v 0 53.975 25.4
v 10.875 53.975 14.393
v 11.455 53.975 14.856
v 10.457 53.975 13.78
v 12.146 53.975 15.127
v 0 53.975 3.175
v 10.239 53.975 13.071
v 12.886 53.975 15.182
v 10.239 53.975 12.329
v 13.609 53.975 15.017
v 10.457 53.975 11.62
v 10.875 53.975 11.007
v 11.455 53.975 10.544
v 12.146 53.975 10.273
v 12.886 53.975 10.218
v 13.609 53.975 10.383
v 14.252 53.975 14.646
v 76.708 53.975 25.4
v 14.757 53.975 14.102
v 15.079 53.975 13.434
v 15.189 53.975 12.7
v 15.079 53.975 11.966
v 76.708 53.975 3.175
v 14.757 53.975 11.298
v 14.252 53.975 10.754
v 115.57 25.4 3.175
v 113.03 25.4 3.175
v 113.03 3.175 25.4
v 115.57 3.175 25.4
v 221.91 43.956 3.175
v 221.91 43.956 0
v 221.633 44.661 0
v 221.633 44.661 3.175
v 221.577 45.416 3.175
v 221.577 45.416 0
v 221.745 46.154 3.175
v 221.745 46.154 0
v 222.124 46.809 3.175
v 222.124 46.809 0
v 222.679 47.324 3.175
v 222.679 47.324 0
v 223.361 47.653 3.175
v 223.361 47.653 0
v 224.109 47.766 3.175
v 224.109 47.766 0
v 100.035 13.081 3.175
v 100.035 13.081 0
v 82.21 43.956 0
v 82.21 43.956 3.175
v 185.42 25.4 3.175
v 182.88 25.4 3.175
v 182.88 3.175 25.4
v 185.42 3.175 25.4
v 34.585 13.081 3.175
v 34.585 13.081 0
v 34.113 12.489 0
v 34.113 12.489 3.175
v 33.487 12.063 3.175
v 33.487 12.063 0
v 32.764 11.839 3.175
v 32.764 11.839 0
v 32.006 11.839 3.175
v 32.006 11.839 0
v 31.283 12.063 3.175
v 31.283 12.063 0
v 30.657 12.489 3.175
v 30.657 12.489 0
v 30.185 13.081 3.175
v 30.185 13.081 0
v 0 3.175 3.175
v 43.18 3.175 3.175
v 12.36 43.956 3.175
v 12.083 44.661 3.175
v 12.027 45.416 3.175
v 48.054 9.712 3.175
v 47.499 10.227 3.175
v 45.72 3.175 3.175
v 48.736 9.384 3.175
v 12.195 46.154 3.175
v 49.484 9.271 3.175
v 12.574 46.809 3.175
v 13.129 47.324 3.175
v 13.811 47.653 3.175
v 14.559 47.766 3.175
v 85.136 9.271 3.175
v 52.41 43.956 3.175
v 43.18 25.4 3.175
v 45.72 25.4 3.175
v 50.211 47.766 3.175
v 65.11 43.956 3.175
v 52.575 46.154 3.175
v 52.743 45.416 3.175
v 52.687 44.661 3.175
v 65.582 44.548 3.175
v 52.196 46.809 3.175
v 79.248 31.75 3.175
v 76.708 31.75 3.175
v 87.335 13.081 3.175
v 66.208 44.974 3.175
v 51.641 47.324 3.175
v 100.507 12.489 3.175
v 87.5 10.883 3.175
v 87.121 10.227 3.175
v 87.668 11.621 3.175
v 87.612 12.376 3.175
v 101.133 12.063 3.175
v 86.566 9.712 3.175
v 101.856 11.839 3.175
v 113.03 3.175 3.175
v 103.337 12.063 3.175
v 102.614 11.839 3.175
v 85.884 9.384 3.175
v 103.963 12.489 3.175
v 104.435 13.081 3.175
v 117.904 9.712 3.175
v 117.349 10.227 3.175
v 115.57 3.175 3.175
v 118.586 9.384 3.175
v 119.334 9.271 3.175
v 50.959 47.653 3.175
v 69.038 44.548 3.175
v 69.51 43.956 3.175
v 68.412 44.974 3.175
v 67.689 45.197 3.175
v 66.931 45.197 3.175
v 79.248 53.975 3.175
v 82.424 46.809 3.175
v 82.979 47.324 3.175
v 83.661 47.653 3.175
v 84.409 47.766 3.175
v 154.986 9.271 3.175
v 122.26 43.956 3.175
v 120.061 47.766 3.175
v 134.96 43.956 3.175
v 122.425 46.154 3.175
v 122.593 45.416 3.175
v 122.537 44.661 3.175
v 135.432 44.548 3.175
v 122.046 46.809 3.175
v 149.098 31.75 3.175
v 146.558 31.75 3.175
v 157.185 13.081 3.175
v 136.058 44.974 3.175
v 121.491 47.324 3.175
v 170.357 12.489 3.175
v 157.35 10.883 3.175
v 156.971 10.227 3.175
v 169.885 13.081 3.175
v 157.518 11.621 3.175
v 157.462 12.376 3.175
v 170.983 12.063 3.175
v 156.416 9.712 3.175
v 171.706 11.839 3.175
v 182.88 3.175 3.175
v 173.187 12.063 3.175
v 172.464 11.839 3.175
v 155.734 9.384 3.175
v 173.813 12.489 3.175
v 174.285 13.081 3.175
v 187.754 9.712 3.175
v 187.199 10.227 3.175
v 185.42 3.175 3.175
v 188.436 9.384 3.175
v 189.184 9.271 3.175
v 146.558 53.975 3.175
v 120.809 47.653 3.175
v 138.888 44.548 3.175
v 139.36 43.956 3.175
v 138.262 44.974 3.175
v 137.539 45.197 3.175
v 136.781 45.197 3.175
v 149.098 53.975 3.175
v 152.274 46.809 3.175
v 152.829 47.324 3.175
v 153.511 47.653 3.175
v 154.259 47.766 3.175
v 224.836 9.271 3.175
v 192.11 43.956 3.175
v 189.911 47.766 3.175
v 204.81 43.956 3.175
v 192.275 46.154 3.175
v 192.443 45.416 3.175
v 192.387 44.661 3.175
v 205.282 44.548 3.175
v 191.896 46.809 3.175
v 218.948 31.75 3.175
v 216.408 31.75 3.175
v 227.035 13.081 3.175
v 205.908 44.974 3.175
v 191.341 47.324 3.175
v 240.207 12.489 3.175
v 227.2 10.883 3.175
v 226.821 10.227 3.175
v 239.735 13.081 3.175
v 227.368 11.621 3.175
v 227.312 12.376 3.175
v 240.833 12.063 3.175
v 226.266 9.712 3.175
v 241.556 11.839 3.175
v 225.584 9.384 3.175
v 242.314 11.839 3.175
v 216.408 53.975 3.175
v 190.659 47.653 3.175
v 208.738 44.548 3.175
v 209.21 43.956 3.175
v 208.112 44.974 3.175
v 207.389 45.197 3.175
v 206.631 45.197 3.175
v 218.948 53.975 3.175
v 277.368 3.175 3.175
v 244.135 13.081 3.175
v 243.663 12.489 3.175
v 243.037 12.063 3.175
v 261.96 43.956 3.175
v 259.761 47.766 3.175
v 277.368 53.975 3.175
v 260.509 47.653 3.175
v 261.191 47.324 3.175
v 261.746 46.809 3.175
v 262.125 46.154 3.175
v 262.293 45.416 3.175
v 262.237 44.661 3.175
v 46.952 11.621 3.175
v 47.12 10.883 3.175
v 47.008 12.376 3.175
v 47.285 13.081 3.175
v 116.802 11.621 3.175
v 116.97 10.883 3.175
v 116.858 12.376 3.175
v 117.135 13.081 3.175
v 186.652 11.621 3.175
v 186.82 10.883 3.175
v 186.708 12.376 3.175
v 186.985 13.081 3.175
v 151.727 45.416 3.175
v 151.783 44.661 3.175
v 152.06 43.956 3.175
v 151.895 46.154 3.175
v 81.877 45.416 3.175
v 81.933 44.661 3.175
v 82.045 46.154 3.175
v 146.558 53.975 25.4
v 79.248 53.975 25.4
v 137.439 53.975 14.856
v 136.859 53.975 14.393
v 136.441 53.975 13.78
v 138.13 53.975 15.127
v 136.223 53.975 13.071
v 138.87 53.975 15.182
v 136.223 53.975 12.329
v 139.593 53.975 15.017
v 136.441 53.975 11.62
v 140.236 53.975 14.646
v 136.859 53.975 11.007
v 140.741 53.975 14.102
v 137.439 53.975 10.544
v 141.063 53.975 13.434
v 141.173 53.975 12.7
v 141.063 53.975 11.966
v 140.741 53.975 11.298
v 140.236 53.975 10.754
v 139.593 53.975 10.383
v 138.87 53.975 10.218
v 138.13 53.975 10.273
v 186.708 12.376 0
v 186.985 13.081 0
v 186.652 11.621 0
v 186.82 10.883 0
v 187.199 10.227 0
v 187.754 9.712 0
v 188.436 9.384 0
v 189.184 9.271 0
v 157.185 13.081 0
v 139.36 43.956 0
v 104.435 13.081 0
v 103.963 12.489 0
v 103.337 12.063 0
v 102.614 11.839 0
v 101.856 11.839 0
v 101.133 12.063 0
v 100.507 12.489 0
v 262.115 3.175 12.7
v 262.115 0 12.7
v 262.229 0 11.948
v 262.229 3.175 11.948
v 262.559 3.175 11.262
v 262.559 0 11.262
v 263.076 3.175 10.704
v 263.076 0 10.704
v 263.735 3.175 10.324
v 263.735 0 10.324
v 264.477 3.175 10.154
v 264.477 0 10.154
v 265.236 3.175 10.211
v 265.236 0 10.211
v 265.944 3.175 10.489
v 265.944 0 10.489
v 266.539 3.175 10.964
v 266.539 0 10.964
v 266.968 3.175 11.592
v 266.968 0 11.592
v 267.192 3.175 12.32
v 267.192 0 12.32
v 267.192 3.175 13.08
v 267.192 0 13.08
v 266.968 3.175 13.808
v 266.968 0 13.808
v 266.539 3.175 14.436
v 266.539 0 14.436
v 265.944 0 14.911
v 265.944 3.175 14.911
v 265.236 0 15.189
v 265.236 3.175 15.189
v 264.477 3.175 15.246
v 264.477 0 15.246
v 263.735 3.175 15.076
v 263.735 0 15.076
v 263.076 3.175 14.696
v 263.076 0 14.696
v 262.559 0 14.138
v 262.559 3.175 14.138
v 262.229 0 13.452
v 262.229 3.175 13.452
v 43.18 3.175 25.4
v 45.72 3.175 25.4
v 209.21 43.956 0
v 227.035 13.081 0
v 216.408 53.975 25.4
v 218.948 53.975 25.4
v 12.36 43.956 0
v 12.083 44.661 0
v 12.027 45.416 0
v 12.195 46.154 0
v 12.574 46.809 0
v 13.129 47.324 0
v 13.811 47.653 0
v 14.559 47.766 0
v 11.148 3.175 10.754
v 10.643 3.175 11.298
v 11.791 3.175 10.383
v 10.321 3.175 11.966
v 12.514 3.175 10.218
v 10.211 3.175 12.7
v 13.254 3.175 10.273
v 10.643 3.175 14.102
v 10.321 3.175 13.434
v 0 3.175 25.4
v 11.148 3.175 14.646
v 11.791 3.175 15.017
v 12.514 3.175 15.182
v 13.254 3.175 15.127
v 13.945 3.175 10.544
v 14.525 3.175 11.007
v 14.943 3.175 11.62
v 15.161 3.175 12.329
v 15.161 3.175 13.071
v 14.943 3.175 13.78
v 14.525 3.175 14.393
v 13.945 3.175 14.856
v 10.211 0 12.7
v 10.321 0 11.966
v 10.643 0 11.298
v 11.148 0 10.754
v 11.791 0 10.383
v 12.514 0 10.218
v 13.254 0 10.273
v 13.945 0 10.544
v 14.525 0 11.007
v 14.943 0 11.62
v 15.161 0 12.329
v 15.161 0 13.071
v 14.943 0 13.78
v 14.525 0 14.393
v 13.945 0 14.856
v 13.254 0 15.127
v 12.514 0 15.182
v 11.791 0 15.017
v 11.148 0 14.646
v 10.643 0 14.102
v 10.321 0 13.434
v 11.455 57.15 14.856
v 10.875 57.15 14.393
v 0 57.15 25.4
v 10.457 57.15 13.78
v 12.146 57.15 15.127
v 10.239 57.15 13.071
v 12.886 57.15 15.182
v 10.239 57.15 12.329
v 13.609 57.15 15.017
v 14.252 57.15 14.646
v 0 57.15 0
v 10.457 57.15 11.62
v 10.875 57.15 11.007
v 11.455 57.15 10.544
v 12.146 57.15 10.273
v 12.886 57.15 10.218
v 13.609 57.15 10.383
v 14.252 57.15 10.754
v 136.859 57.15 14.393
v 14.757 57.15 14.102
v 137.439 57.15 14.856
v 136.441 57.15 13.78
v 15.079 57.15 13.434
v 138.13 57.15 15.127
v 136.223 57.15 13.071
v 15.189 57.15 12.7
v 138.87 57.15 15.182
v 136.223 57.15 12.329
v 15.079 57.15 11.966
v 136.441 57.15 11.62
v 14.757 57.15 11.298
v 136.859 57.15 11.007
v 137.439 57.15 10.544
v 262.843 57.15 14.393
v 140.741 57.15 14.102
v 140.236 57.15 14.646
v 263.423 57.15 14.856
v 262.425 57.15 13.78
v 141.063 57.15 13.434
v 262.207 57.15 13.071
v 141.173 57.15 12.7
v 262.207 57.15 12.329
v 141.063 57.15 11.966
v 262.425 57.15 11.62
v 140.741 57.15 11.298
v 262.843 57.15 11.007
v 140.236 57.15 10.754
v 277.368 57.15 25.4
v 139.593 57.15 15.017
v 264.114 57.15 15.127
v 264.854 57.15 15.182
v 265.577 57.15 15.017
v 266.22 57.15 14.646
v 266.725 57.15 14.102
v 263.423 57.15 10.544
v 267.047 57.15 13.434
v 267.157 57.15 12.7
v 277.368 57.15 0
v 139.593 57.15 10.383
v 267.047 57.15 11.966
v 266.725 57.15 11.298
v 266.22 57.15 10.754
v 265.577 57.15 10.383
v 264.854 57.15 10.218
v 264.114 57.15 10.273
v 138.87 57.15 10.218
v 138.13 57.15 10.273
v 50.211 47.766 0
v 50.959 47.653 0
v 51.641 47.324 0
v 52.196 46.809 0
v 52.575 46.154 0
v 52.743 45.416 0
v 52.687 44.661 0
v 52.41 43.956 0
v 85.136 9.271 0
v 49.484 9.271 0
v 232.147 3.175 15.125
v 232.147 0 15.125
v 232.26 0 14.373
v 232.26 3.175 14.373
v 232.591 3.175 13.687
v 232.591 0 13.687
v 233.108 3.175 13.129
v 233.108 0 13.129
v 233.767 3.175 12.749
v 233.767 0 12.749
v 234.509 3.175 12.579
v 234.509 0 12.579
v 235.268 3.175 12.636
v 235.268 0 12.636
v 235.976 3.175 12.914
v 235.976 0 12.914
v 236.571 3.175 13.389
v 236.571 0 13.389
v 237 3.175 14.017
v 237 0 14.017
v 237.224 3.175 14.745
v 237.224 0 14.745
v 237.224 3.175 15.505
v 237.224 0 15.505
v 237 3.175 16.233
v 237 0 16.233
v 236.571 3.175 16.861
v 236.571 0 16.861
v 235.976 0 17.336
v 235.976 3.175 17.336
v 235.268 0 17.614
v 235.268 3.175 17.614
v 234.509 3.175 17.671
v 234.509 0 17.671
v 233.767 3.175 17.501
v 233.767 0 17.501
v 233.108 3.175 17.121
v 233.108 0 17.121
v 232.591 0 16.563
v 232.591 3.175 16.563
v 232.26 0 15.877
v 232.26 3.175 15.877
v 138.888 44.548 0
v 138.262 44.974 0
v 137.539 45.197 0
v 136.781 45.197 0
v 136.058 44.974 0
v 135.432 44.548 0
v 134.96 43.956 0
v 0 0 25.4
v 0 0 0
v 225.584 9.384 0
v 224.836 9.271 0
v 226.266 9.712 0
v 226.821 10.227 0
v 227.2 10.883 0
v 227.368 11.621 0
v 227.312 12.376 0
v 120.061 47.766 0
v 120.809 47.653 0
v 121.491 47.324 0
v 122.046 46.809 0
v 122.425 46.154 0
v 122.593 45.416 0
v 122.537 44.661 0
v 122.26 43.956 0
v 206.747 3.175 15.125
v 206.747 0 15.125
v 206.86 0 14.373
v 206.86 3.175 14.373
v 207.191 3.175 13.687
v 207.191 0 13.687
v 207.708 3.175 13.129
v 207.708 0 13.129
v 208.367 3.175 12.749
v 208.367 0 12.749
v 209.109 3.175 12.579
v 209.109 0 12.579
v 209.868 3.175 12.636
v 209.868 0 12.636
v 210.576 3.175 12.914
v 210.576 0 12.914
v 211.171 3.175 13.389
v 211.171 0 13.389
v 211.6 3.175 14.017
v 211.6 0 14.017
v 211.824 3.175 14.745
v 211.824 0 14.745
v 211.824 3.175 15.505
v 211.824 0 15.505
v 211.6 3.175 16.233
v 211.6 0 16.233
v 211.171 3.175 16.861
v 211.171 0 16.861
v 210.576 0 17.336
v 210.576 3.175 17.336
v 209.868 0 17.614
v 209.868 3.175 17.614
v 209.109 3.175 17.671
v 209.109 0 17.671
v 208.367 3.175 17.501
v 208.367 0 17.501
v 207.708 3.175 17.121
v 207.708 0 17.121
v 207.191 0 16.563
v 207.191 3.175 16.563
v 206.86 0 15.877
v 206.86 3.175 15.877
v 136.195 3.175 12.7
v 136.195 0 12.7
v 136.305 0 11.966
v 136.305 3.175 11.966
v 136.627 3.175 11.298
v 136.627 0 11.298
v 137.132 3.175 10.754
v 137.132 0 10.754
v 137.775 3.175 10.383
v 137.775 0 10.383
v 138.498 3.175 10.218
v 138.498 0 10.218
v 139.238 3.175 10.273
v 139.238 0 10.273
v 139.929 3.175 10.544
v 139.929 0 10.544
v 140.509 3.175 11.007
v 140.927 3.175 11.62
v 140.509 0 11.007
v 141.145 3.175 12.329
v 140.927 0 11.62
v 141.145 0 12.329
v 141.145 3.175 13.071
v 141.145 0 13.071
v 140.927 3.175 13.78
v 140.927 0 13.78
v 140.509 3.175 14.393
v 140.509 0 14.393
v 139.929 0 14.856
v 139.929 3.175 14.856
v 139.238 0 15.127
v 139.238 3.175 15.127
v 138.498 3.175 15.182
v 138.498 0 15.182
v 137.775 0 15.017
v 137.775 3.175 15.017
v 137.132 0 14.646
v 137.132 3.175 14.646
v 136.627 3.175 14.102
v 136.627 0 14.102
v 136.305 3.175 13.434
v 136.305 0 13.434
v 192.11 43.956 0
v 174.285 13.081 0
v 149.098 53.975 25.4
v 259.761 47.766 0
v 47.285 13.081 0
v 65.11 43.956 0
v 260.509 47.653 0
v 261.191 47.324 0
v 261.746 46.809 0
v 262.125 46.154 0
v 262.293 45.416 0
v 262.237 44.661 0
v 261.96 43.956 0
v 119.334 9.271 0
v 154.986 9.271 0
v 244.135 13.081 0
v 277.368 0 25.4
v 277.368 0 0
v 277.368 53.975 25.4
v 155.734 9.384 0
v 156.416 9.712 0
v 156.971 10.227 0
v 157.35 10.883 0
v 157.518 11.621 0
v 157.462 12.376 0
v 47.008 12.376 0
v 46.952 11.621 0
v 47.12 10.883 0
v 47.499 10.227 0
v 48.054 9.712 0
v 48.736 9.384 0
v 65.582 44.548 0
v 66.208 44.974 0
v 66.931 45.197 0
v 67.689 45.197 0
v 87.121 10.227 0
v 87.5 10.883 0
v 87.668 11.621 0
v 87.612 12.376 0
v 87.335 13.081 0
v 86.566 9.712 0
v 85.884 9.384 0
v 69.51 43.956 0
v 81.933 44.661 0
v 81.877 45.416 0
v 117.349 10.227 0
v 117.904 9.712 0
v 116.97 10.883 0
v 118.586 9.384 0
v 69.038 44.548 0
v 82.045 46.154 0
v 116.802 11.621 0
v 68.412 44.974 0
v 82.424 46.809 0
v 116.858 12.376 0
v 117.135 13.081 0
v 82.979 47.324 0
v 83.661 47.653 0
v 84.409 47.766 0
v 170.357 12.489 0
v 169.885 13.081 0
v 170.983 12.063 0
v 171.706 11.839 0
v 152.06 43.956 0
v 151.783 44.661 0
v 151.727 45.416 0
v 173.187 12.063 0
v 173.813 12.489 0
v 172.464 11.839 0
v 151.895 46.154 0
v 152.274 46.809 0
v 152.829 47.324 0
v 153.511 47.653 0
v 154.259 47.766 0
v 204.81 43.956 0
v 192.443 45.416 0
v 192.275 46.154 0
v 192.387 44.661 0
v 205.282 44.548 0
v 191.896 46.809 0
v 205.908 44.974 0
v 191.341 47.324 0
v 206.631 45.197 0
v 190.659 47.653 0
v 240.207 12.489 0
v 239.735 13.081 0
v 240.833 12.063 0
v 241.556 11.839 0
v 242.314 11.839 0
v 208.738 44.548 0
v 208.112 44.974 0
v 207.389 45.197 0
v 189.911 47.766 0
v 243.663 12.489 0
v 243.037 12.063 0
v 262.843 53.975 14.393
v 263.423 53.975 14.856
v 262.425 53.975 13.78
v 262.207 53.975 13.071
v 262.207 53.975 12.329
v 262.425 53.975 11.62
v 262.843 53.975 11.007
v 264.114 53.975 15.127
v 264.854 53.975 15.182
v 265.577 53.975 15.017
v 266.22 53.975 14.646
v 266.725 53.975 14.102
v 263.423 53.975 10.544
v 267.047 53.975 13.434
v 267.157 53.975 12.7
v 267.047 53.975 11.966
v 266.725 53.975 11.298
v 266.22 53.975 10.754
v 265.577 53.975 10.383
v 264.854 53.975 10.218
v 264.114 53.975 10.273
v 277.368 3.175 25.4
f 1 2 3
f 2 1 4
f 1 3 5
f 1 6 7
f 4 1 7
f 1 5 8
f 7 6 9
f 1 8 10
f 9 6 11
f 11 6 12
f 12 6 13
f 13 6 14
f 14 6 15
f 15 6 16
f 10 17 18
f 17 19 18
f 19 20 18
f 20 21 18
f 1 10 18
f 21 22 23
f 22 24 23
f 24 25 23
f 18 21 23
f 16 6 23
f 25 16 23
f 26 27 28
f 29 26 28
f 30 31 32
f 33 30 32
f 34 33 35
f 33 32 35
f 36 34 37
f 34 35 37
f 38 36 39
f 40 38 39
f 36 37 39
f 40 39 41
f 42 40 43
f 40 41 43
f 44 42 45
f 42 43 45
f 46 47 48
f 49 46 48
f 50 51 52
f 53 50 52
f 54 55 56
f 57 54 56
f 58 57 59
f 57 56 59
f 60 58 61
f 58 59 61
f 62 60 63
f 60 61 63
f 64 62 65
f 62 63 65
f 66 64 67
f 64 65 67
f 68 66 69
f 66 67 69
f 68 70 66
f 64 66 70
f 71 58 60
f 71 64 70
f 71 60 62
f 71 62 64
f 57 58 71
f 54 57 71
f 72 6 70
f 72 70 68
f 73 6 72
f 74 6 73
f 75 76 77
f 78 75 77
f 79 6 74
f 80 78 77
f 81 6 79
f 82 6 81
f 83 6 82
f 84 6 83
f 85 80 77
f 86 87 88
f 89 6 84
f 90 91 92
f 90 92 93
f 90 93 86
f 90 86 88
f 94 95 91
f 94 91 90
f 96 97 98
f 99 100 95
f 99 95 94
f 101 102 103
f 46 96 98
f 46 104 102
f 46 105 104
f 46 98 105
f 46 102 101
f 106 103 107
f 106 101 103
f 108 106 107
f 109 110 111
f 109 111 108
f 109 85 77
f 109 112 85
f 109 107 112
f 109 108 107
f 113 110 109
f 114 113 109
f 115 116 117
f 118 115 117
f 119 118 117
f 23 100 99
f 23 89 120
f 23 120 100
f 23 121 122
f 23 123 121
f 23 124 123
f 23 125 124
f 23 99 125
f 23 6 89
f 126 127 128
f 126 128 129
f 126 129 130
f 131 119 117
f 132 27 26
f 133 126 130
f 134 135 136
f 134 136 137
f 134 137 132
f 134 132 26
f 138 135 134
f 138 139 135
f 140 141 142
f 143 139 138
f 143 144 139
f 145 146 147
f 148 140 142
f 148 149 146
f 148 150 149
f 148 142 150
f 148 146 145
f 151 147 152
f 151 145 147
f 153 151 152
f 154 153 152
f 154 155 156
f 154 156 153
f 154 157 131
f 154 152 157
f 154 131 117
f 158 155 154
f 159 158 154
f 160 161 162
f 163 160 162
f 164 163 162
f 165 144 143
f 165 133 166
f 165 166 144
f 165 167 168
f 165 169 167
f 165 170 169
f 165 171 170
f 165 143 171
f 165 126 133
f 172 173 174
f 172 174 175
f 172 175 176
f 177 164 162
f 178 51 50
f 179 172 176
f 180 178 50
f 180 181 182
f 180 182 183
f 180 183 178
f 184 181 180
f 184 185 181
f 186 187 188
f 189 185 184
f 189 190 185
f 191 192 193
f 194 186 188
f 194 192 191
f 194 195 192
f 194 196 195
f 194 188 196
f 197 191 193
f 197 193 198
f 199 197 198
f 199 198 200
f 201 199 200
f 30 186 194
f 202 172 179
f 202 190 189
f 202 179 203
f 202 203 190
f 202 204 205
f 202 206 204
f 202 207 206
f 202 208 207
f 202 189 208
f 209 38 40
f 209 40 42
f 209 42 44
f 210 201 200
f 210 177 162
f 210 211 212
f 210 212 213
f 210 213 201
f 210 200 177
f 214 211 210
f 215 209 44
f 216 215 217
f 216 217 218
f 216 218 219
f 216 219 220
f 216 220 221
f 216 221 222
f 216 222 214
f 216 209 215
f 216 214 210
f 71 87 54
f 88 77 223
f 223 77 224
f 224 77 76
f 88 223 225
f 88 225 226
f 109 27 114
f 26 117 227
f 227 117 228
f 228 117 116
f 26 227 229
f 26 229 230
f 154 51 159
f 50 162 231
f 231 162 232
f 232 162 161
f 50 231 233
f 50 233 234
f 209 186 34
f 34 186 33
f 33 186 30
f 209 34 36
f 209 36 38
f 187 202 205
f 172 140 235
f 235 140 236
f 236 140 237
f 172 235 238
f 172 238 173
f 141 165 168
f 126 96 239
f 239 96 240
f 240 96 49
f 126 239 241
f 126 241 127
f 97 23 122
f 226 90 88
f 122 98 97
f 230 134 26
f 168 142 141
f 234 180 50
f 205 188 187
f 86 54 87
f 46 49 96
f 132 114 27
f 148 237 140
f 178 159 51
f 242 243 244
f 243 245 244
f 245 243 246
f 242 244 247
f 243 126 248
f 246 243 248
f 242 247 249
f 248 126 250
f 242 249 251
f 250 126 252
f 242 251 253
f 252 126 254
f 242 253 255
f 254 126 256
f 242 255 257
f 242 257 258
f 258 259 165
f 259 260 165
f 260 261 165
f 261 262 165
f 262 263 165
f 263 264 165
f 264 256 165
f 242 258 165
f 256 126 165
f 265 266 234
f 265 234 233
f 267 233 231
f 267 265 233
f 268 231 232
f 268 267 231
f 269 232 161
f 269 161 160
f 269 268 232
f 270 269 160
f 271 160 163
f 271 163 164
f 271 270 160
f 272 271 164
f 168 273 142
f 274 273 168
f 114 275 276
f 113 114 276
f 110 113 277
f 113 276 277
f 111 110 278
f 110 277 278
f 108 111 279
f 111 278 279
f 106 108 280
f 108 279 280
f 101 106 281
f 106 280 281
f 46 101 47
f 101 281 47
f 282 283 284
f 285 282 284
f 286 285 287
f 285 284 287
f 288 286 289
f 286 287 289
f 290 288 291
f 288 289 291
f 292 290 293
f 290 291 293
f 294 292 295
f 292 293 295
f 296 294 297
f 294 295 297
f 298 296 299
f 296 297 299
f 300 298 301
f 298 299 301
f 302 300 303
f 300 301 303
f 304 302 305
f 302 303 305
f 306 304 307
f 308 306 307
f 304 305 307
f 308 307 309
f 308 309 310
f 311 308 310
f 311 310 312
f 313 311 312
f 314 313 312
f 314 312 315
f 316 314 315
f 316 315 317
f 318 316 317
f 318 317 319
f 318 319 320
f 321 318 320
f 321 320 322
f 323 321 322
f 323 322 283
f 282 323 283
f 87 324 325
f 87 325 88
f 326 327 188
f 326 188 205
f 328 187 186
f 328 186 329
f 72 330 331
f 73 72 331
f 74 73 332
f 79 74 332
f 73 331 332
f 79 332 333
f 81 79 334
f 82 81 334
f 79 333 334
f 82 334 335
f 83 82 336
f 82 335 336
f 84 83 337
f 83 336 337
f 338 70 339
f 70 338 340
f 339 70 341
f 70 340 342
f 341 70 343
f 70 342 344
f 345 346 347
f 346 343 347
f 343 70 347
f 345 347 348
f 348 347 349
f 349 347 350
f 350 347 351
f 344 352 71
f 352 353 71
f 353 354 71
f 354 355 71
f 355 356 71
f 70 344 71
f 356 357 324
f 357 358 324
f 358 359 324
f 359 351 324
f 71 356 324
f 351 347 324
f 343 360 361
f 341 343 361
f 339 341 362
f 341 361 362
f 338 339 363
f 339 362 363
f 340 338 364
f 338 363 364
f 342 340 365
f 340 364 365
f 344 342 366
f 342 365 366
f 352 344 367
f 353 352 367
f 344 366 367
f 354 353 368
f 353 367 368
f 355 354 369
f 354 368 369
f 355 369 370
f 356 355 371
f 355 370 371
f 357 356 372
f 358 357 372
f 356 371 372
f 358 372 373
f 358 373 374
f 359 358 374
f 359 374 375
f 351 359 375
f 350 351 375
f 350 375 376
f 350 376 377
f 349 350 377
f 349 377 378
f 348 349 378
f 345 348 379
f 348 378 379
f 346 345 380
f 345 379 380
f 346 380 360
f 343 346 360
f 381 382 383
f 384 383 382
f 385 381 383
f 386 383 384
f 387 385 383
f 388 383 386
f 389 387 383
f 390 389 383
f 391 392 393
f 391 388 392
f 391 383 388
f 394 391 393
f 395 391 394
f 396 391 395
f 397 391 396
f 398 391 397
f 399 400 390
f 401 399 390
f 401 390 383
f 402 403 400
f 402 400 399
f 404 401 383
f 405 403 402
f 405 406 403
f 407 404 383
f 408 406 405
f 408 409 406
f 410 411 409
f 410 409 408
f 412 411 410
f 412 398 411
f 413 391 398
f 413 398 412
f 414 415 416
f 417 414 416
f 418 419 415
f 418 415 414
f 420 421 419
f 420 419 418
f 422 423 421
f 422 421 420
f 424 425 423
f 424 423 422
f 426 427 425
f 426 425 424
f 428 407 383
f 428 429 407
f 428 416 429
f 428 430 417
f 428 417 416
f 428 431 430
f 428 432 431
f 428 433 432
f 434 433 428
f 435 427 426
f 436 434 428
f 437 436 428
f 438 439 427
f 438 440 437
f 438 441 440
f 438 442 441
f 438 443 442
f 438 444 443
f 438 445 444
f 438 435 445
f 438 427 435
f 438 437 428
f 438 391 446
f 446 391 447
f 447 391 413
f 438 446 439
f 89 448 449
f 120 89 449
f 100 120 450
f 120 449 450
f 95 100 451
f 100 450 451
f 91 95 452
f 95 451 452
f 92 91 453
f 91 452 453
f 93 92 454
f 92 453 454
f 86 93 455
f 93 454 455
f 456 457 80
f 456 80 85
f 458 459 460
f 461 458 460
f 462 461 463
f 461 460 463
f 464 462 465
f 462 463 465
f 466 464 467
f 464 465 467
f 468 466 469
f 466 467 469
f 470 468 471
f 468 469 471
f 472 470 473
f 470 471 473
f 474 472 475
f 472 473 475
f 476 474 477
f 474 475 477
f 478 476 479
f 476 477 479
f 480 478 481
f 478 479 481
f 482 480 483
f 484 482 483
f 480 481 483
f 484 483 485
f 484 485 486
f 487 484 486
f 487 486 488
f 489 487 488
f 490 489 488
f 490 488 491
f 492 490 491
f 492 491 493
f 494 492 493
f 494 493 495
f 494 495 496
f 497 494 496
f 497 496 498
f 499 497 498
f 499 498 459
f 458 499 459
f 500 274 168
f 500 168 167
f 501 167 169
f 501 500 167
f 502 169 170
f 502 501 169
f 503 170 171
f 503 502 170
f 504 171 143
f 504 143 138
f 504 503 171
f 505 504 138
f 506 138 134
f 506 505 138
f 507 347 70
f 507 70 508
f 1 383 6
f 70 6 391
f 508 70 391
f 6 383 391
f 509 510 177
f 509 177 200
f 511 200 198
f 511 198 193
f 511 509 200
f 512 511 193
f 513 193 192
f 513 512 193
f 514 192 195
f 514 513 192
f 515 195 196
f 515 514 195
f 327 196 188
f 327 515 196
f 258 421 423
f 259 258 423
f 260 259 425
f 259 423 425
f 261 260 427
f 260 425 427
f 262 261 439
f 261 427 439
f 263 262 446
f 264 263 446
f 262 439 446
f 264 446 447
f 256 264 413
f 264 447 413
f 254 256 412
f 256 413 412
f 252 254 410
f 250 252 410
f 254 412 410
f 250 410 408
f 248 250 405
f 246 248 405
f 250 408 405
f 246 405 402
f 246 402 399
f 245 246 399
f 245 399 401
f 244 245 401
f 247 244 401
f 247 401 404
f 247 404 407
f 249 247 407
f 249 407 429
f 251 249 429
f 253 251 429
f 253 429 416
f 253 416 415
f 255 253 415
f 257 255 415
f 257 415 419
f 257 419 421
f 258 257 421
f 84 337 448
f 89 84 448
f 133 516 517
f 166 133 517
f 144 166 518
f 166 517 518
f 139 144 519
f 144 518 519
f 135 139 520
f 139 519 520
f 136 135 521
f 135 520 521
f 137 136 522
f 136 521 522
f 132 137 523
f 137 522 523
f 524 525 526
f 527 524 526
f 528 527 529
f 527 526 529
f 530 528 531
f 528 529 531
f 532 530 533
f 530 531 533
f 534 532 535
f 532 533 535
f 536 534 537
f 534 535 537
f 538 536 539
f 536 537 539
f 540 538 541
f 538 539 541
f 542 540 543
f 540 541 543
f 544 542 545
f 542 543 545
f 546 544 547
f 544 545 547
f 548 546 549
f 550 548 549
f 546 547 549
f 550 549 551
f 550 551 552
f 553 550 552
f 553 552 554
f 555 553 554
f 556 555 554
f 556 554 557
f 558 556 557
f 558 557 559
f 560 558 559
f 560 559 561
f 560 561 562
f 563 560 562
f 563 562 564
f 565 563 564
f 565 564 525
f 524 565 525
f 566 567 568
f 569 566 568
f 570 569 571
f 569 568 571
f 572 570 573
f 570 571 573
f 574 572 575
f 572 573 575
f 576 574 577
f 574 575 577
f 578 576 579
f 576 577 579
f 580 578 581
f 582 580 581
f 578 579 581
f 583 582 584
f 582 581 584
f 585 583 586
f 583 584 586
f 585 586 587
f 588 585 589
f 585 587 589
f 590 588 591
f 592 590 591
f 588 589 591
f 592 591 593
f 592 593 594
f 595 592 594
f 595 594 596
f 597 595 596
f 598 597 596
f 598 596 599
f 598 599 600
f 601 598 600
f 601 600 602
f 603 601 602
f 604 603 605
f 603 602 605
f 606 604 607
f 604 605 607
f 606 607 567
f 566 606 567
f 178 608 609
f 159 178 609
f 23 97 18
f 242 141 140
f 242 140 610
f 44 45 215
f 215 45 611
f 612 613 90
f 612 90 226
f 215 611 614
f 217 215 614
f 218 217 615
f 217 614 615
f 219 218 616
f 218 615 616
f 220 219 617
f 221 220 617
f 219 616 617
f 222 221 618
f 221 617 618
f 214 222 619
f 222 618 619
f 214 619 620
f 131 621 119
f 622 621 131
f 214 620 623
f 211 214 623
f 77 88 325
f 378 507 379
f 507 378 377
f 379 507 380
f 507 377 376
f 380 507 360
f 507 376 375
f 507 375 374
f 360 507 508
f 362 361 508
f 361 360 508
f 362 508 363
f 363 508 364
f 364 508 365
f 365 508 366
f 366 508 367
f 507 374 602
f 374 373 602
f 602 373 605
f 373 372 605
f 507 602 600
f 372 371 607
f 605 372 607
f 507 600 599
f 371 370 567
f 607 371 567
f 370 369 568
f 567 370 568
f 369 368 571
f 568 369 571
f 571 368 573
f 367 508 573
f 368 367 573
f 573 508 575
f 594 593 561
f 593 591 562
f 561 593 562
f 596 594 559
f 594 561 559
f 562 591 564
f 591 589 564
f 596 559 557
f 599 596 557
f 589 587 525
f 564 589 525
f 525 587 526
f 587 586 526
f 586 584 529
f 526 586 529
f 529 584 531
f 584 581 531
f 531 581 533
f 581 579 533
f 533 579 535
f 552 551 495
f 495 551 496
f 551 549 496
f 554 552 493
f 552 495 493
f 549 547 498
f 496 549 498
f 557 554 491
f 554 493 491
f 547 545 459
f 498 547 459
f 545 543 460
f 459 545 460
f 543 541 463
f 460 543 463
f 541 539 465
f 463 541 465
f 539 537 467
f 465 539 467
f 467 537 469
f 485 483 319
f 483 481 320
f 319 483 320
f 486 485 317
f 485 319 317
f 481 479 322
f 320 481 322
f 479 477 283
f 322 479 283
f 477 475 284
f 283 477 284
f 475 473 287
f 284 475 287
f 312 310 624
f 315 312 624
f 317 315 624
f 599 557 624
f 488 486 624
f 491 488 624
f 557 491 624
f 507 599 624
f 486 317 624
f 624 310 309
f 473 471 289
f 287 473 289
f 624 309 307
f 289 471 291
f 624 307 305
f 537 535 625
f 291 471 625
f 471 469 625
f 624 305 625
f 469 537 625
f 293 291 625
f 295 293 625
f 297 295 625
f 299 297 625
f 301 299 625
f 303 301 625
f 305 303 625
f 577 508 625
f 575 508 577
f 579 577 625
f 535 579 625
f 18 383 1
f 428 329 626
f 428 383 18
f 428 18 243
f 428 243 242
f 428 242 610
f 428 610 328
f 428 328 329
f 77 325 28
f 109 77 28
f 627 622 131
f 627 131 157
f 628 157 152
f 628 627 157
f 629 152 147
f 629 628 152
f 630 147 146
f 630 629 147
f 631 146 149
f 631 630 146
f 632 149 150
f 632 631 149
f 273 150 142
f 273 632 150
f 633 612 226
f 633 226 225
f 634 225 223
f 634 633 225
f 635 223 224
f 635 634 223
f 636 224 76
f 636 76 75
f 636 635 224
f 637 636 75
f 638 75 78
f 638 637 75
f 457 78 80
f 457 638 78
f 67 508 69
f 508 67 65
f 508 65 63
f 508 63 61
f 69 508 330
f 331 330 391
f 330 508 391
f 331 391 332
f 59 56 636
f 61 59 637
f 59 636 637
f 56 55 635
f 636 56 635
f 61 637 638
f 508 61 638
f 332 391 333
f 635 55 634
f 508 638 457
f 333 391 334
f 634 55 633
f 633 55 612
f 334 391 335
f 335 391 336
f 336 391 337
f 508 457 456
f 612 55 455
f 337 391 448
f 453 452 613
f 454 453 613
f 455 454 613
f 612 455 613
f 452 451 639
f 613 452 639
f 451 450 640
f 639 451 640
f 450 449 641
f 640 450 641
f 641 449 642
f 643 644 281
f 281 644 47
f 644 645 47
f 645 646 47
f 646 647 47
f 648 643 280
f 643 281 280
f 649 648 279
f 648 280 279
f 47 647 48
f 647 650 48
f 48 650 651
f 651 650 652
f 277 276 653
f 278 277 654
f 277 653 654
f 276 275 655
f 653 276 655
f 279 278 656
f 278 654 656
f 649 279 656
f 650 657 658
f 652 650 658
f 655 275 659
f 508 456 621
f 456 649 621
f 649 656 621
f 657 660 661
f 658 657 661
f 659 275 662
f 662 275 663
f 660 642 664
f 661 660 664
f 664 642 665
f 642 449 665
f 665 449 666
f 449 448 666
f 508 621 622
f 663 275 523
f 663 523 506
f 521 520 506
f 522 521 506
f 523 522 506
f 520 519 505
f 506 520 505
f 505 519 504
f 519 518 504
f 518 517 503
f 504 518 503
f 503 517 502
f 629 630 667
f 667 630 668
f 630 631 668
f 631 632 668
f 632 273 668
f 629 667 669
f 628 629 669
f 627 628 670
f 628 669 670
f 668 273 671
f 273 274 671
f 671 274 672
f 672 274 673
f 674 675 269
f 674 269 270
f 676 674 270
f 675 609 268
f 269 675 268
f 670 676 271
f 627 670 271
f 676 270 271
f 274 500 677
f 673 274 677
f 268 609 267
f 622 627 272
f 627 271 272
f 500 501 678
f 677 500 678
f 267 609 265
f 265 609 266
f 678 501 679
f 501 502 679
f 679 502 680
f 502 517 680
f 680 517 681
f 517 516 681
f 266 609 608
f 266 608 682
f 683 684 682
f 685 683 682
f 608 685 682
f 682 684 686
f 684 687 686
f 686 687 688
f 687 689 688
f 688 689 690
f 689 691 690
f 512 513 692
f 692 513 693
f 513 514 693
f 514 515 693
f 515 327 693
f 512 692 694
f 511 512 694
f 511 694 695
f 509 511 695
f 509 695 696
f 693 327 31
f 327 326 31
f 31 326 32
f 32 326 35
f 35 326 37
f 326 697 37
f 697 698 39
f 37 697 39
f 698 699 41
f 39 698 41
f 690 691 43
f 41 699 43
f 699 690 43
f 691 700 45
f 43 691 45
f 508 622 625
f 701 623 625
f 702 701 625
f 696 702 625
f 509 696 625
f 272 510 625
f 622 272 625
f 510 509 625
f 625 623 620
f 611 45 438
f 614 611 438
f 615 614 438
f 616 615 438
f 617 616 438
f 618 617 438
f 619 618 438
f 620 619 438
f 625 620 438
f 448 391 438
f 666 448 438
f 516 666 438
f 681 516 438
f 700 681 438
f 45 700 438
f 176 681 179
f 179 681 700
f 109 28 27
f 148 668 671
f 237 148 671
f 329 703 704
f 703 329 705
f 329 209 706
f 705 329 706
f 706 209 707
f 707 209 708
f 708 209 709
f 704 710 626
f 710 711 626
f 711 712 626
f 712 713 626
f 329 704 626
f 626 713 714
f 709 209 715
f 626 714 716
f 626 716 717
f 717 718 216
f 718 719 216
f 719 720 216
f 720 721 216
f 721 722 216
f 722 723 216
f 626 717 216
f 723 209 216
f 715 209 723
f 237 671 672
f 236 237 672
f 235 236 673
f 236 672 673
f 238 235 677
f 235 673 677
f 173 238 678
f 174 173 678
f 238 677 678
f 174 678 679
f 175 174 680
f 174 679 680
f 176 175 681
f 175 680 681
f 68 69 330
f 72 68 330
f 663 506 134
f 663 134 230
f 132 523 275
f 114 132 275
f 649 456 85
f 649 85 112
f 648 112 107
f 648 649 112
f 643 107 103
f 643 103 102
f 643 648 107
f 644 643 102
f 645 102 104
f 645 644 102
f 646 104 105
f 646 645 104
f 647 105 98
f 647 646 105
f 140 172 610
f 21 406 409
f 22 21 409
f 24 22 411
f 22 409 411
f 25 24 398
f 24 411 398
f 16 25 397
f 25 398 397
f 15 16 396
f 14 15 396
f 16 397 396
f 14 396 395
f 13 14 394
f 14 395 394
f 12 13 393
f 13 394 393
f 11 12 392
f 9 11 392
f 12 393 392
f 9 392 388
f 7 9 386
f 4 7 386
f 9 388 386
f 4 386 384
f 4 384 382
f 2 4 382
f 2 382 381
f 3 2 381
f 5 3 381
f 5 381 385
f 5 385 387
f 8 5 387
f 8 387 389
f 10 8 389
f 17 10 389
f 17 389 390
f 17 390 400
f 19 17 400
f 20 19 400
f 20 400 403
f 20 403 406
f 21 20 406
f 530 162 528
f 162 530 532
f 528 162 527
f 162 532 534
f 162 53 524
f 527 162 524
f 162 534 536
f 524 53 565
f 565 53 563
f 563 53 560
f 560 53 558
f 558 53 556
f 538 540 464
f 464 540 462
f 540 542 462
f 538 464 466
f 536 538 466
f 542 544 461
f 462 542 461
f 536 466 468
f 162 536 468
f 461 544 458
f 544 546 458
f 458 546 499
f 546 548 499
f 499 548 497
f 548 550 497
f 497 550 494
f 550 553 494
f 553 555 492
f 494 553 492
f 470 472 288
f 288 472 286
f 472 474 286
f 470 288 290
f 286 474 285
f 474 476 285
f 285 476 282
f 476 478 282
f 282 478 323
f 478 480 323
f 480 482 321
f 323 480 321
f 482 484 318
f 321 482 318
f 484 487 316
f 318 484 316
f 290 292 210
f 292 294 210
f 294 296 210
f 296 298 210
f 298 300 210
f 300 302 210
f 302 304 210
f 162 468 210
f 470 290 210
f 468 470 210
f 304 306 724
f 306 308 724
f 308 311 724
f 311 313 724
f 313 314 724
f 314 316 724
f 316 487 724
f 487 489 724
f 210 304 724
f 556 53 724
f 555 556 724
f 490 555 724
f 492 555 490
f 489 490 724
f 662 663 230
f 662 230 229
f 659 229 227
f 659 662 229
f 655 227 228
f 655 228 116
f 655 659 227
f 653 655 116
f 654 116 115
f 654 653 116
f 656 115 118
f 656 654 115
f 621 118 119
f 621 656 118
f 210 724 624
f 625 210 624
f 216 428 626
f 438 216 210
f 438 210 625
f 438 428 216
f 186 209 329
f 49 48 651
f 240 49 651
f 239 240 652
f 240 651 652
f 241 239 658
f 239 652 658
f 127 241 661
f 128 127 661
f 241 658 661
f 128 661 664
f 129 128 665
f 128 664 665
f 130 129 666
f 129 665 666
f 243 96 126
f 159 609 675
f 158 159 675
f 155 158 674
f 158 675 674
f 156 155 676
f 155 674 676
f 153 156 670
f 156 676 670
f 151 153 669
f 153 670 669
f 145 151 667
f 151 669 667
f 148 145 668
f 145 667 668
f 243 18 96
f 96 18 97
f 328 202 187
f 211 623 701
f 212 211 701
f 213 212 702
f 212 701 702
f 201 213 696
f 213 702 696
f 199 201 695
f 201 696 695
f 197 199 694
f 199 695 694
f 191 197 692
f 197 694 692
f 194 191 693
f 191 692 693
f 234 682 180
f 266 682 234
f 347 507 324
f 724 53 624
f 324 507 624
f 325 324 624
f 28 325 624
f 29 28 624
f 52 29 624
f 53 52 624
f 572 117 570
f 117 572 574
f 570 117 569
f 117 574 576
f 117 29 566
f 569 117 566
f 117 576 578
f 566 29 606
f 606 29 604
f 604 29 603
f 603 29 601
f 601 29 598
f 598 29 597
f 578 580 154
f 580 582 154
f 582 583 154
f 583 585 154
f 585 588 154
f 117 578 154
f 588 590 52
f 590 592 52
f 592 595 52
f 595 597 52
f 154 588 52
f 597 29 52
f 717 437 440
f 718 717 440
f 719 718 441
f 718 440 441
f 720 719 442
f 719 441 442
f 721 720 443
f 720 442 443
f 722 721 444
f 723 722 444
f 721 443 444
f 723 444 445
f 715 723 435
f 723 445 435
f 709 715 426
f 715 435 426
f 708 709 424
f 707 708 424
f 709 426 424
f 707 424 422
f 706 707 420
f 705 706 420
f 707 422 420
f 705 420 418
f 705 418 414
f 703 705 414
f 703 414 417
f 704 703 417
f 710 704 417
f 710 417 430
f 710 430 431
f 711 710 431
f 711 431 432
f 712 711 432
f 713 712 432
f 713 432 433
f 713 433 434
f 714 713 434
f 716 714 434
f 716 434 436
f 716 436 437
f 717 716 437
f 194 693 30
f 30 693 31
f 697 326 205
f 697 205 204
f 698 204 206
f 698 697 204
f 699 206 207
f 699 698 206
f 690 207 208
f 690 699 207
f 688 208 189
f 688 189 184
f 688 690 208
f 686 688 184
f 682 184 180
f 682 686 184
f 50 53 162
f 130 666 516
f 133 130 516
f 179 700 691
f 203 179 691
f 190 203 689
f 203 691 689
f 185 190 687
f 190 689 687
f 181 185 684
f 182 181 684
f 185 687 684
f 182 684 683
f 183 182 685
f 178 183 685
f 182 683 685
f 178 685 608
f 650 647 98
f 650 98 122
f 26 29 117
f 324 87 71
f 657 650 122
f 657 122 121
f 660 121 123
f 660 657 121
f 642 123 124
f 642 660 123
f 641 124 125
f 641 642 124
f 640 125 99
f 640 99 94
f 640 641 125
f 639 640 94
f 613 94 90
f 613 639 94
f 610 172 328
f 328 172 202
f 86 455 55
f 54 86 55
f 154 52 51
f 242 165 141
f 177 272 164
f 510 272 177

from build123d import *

# Parameters (mm, degrees)
SKETCH1_W                  = 277.368
SKETCH1_H                  = 57.15
BOSS_EXTRUDE1_DEPTH        = 3.175
SKETCH2_W                  = 277.368
SKETCH2_H                  = 25.4
BOSS_EXTRUDE2_DEPTH        = 3.175
SKETCH3_W                  = 277.368
SKETCH3_H                  = 25.4
BOSS_EXTRUDE3_DEPTH        = 3.175
BOSS_EXTRUDE4_DEPTH        = 2.54
BOSS_EXTRUDE5_DEPTH        = 2.54
BOSS_EXTRUDE6_DEPTH        = 2.54
BOSS_EXTRUDE7_DEPTH        = 2.54
BOSS_EXTRUDE8_DEPTH        = 2.54
BOSS_EXTRUDE9_DEPTH        = 2.54
F_10_CLEARANCE_HOLE1_D     = 5.1054
F_10_CLEARANCE_HOLE1_DEPTH = 3.175
F_10_CLEARANCE_HOLE2_D     = 5.1054
F_10_CLEARANCE_HOLE2_DEPTH = 3.175
F_10_CLEARANCE_HOLE3_D     = 4.9784
F_10_CLEARANCE_HOLE3_DEPTH = 3.175
F_10_CLEARANCE_HOLE4_D     = 4.9784
SKETCH22_R                 = 3.770312501
SKETCH22_R_2               = 4.062065624
BOSS_EXTRUDE10_DEPTH       = 3.175


with BuildPart() as part:
    # Sketch1 → Boss-Extrude1 (new body)
    with BuildSketch(Plane.XY):
        with Locations((138.684, 28.575)):
            Rectangle(SKETCH1_W, SKETCH1_H)
        with BuildLine():
            Line((30.185295474, 13.081), (12.359704526, 43.955829198))
            ThreePointArc((12.359704526, 43.955829198), (12.359704526, 46.495829198), (14.559409051, 47.765829198))
            Line((14.559409051, 47.765829198), (50.210590949, 47.765829198))
            ThreePointArc((50.210590949, 47.765829198), (52.410295474, 46.495829198), (52.410295474, 43.955829198))
            Line((52.410295474, 43.955829198), (34.584704526, 13.081))
            ThreePointArc((34.584704526, 13.081), (32.385, 11.811), (30.185295474, 13.081))
        make_face(mode=Mode.SUBTRACT)
        with BuildLine():
            Line((49.484409051, 9.271), (85.135590949, 9.271))
            ThreePointArc((85.135590949, 9.271), (87.335295474, 10.541), (87.335295474, 13.081))
            Line((87.335295474, 13.081), (69.509704526, 43.955829198))
            ThreePointArc((69.509704526, 43.955829198), (67.31, 45.225829198), (65.110295474, 43.955829198))
            Line((65.110295474, 43.955829198), (47.284704526, 13.081))
            ThreePointArc((47.284704526, 13.081), (47.284704526, 10.541), (49.484409051, 9.271))
        make_face(mode=Mode.SUBTRACT)
        with BuildLine():
            Line((100.035295474, 13.081), (82.209704526, 43.955829198))
            ThreePointArc((82.209704526, 43.955829198), (82.209704526, 46.495829198), (84.409409051, 47.765829198))
            Line((84.409409051, 47.765829198), (120.060590949, 47.765829198))
            ThreePointArc((120.060590949, 47.765829198), (122.260295474, 46.495829198), (122.260295474, 43.955829198))
            Line((122.260295474, 43.955829198), (104.434704526, 13.081))
            ThreePointArc((104.434704526, 13.081), (102.235, 11.811), (100.035295474, 13.081))
        make_face(mode=Mode.SUBTRACT)
        with BuildLine():
            Line((119.334409051, 9.271), (154.985590949, 9.271))
            ThreePointArc((154.985590949, 9.271), (157.185295474, 10.541), (157.185295474, 13.081))
            Line((157.185295474, 13.081), (139.359704526, 43.955829198))
            ThreePointArc((139.359704526, 43.955829198), (137.16, 45.225829198), (134.960295474, 43.955829198))
            Line((134.960295474, 43.955829198), (117.134704526, 13.081))
            ThreePointArc((117.134704526, 13.081), (117.134704526, 10.541), (119.334409051, 9.271))
        make_face(mode=Mode.SUBTRACT)
        with BuildLine():
            Line((169.885295474, 13.081), (152.059704526, 43.955829198))
            ThreePointArc((152.059704526, 43.955829198), (152.059704526, 46.495829198), (154.259409051, 47.765829198))
            Line((154.259409051, 47.765829198), (189.910590949, 47.765829198))
            ThreePointArc((189.910590949, 47.765829198), (192.110295474, 46.495829198), (192.110295474, 43.955829198))
            Line((192.110295474, 43.955829198), (174.284704526, 13.081))
            ThreePointArc((174.284704526, 13.081), (172.085, 11.811), (169.885295474, 13.081))
        make_face(mode=Mode.SUBTRACT)
        with BuildLine():
            Line((189.184409051, 9.271), (224.835590949, 9.271))
            ThreePointArc((224.835590949, 9.271), (227.035295474, 10.541), (227.035295474, 13.081))
            Line((227.035295474, 13.081), (209.209704526, 43.955829198))
            ThreePointArc((209.209704526, 43.955829198), (207.01, 45.225829198), (204.810295474, 43.955829198))
            Line((204.810295474, 43.955829198), (186.984704526, 13.081))
            ThreePointArc((186.984704526, 13.081), (186.984704526, 10.541), (189.184409051, 9.271))
        make_face(mode=Mode.SUBTRACT)
        with BuildLine():
            Line((239.735295474, 13.081), (221.909704526, 43.955829198))
            ThreePointArc((221.909704526, 43.955829198), (221.909704526, 46.495829198), (224.109409051, 47.765829198))
            Line((224.109409051, 47.765829198), (259.760590949, 47.765829198))
            ThreePointArc((259.760590949, 47.765829198), (261.960295474, 46.495829198), (261.960295474, 43.955829198))
            Line((261.960295474, 43.955829198), (244.134704526, 13.081))
            ThreePointArc((244.134704526, 13.081), (241.935, 11.811), (239.735295474, 13.081))
        make_face(mode=Mode.SUBTRACT)
    extrude(amount=BOSS_EXTRUDE1_DEPTH)

    # Sketch2 → Boss-Extrude2 (add)
    with BuildSketch(Plane(origin=(0, 57.15, 0), x_dir=(1, 0, 0), z_dir=(0, 1, 0))):
        with Locations((138.684, -12.7)):
            Rectangle(SKETCH2_W, SKETCH2_H)
    extrude(amount=-BOSS_EXTRUDE2_DEPTH)

    # Sketch3 → Boss-Extrude3 (add)
    with BuildSketch(Plane.XZ):
        with Locations((138.684, 12.7)):
            Rectangle(SKETCH3_W, SKETCH3_H)
    extrude(amount=-BOSS_EXTRUDE3_DEPTH)

    # Sketch5 → Boss-Extrude4 (add)
    with BuildSketch(Plane.YZ.offset(43.18)):
        Polygon((3.175, 3.175), (3.175, 25.4), (25.4, 3.175), align=None)
    extrude(amount=BOSS_EXTRUDE4_DEPTH)

    # Sketch6 → Boss-Extrude5 (add)
    with BuildSketch(Plane.YZ.offset(113.03)):
        Polygon((3.175, 25.4), (3.175, 3.175), (25.4, 3.175), align=None)
    extrude(amount=BOSS_EXTRUDE5_DEPTH)

    # Sketch7 → Boss-Extrude6 (add)
    with BuildSketch(Plane.YZ.offset(182.88)):
        Polygon((3.175, 25.4), (3.175, 3.175), (25.4, 3.175), align=None)
    extrude(amount=BOSS_EXTRUDE6_DEPTH)

    # Sketch8 → Boss-Extrude7 (add)
    with BuildSketch(Plane(origin=(76.708, 0, 0), x_dir=(0, -1, 0), z_dir=(-1, 0, 0))):
        Polygon((-53.975, 3.175), (-53.975, 25.4), (-31.75, 3.175), align=None)
    extrude(amount=-BOSS_EXTRUDE7_DEPTH)

    # Sketch9 → Boss-Extrude8 (add)
    with BuildSketch(Plane(origin=(146.558, 0, 0), x_dir=(0, -1, 0), z_dir=(-1, 0, 0))):
        Polygon((-53.975, 25.4), (-53.975, 3.175), (-31.75, 3.175), align=None)
    extrude(amount=-BOSS_EXTRUDE8_DEPTH)

    # Sketch10 → Boss-Extrude9 (add)
    with BuildSketch(Plane(origin=(216.408, 0, 0), x_dir=(0, -1, 0), z_dir=(-1, 0, 0))):
        Polygon((-53.975, 25.4), (-53.975, 3.175), (-31.75, 3.175), align=None)
    extrude(amount=-BOSS_EXTRUDE9_DEPTH)

    # #10 Clearance Hole1
    with Locations(Plane(origin=(0, 3.175, 0), x_dir=(1, 0, 0), z_dir=(0, 1, 0))):
        with Locations((209.299668917, -15.125), (234.699668917, -15.125)):
            Hole(F_10_CLEARANCE_HOLE1_D / 2, depth=F_10_CLEARANCE_HOLE1_DEPTH)

    # #10 Clearance Hole2
    with Locations(Plane(origin=(0, 3.175, 0), x_dir=(1, 0, 0), z_dir=(0, 1, 0))):
        with Locations((264.668, -12.7)):
            Hole(F_10_CLEARANCE_HOLE2_D / 2, depth=F_10_CLEARANCE_HOLE2_DEPTH)

    # #10 Clearance Hole3
    with Locations(Plane(origin=(0, 3.175, 0), x_dir=(1, 0, 0), z_dir=(0, 1, 0))):
        with Locations((138.684, -12.7), (12.7, -12.7)):
            Hole(F_10_CLEARANCE_HOLE3_D / 2, depth=F_10_CLEARANCE_HOLE3_DEPTH)

    # #10 Clearance Hole4 (through all)
    with Locations(Plane(origin=(0, 53.975, 0), x_dir=(-1, 0, 0), z_dir=(0, -1, 0))):
        with Locations((-138.684, -12.7), (-264.668, -12.7), (-12.7, -12.7)):
            Hole(F_10_CLEARANCE_HOLE4_D / 2)

    # Sketch22 → Boss-Extrude10 (add)
    with BuildSketch(Plane.XZ.offset(-53.975)):
        with Locations((234.69966892, 15.125)):
            Circle(SKETCH22_R)
        with Locations((209.29966892, 15.125)):
            Circle(SKETCH22_R_2)
    extrude(amount=-BOSS_EXTRUDE10_DEPTH)


solid = part.part
